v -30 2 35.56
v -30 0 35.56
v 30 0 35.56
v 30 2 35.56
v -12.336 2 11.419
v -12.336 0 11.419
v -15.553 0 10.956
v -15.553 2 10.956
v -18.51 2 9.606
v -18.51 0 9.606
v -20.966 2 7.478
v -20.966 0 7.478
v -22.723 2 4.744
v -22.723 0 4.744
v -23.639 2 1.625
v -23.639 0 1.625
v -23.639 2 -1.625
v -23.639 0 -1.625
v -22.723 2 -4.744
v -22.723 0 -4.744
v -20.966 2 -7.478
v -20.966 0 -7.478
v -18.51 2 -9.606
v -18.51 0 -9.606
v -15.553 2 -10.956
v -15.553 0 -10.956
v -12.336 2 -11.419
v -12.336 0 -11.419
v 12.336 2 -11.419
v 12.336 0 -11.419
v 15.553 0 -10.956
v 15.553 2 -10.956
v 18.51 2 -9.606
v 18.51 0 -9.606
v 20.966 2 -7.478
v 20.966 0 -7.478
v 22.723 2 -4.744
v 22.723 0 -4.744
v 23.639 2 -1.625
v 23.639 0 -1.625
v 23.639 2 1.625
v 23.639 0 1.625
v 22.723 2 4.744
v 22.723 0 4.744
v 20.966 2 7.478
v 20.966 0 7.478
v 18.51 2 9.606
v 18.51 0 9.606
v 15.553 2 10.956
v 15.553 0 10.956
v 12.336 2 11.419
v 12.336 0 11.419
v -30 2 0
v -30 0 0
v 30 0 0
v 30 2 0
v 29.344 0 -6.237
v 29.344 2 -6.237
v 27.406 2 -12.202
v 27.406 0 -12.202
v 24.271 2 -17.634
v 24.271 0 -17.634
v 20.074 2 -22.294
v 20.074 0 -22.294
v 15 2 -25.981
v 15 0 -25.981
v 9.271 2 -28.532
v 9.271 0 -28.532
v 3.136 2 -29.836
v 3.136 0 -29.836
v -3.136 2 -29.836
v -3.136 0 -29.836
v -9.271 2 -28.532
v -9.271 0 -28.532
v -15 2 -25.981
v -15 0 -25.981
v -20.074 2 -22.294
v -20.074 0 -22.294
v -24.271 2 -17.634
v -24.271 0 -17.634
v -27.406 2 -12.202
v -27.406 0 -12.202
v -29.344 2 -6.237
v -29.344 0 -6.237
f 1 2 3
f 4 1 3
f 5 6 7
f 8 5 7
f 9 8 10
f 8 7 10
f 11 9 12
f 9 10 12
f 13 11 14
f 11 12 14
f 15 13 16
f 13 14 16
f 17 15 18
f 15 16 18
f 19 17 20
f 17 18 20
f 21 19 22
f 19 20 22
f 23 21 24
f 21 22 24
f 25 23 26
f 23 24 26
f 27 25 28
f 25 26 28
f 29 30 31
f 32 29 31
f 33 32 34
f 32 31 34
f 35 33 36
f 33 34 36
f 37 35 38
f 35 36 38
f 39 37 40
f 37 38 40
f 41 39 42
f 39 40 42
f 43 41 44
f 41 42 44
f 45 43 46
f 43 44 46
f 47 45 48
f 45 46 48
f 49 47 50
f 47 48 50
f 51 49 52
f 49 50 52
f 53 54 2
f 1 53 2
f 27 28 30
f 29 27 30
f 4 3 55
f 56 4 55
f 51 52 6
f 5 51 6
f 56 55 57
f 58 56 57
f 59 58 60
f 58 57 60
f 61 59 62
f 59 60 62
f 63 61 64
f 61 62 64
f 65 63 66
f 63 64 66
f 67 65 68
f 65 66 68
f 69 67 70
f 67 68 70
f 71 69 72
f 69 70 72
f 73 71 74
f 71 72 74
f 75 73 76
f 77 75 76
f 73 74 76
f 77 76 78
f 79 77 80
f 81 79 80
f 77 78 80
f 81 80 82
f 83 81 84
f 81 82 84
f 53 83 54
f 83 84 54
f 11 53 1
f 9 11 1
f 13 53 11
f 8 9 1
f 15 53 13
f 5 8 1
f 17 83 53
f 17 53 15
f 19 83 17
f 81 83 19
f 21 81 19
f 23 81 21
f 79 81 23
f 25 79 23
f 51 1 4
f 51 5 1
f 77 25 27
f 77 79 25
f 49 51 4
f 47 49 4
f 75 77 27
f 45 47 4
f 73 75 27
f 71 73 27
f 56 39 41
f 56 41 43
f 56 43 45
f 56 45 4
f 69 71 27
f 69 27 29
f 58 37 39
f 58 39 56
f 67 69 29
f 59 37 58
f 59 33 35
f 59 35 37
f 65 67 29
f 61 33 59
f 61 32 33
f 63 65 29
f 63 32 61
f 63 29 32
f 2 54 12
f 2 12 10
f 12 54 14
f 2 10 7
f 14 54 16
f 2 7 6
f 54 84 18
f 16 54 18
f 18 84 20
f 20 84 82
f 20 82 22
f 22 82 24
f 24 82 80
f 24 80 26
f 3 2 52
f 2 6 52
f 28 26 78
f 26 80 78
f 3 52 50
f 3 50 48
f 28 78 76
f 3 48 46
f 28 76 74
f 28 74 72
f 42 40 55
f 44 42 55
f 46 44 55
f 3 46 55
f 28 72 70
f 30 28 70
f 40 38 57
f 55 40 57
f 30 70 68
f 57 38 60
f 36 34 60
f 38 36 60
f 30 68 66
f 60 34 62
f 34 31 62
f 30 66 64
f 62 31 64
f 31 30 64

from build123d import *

# Parameters (mm, degrees)
BOSS_EXTRUDE1_DEPTH = 2


with BuildPart() as part:
    # Sketch1 → Boss-Extrude1 (new body)
    with BuildSketch(Plane(origin=(0, 0, 0), x_dir=(1, 0, 0), z_dir=(0, 1, 0))):
        with BuildLine():
            Line((-30, 0), (-30, -35.56))
            Line((-30, -35.56), (30, -35.56))
            Line((30, -35.56), (30, 0))
            ThreePointArc((30, 0), (0, 30), (-30, 0))
        make_face()
        with BuildLine():
            Line((12.336270574, -11.418953413), (-12.336270574, -11.418953413))
            ThreePointArc((-12.336270574, -11.418953413), (-23.755223987, 0), (-12.336270574, 11.418953413))
            Line((-12.336270574, 11.418953413), (12.336270574, 11.418953413))
            ThreePointArc((12.336270574, 11.418953413), (23.755223987, 0), (12.336270574, -11.418953413))
        make_face(mode=Mode.SUBTRACT)
    extrude(amount=BOSS_EXTRUDE1_DEPTH)


solid = part.part
